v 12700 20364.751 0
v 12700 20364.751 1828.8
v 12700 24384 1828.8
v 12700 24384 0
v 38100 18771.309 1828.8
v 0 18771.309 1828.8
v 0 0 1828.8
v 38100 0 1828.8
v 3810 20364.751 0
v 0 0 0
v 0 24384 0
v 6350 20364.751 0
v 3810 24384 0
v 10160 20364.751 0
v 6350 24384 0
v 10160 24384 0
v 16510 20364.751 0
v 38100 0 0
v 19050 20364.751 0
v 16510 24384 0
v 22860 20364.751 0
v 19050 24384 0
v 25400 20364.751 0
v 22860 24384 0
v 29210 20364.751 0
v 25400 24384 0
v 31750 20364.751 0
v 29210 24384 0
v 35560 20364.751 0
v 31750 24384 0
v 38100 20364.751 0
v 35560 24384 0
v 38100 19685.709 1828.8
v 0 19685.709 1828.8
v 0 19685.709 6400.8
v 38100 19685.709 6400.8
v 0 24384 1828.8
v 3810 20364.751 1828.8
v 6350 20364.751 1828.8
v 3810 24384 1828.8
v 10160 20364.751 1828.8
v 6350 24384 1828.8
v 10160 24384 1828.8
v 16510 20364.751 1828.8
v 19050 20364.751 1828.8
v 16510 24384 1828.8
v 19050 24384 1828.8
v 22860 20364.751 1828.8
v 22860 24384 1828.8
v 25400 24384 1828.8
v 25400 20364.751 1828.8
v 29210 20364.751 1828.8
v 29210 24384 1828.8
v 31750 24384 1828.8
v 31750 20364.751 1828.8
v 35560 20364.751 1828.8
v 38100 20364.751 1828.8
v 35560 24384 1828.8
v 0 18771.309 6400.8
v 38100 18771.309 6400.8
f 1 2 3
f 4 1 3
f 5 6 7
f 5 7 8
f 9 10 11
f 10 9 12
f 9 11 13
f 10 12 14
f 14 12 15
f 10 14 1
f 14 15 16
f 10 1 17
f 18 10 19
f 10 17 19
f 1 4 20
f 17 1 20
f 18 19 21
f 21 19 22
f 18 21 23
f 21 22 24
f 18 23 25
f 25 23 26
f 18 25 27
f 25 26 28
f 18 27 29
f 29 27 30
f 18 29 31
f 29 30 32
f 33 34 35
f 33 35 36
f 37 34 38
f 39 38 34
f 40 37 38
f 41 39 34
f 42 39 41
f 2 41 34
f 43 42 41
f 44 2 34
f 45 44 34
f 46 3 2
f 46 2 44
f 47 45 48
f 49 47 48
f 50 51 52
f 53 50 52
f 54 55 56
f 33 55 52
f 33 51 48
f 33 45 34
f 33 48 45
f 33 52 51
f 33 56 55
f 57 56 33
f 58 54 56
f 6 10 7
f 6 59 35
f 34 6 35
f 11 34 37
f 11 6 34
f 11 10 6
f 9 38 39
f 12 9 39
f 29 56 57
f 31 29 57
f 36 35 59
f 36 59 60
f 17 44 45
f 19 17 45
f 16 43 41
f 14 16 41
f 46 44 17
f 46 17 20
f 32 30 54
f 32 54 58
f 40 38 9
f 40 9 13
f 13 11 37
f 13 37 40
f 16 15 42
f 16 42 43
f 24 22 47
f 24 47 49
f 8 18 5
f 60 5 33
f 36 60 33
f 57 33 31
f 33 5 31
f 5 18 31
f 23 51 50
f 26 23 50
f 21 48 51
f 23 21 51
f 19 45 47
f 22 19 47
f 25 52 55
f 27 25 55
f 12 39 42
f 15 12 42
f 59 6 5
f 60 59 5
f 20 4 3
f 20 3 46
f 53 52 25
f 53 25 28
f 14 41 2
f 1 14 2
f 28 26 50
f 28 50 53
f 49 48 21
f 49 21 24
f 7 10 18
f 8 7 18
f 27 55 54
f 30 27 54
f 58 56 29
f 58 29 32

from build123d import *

# Parameters (mm, degrees)
SKETCH1_W           = 38100
SKETCH1_H           = 24384
BOSS_EXTRUDE1_DEPTH = 1828.8
SKETCH2_W           = 2540
SKETCH2_H           = 4019.249447419
CUT_EXTRUDE2_DEPTH  = 1828.8
SKETCH3_W           = 38100
SKETCH3_H           = 914.4
BOSS_EXTRUDE3_DEPTH = 4572


with BuildPart() as part:
    # Sketch1 → Boss-Extrude1 (new body)
    with BuildSketch(Plane.XY):
        with Locations((19050, 12192)):
            Rectangle(SKETCH1_W, SKETCH1_H)
    extrude(amount=BOSS_EXTRUDE1_DEPTH)

    # Sketch2 → Cut-Extrude2 (cut)
    with BuildSketch(Plane.XY.offset(1828.8)):
        with Locations((5080, 22374.37527629)):
            Rectangle(SKETCH2_W, SKETCH2_H)
        Polygon((11430, 24384), (10160, 24384), (10160, 20364.750552581), (12700, 20364.750552581), (12700, 24384), align=None)
        with Locations((17780, 22374.37527629)):
            Rectangle(SKETCH2_W, SKETCH2_H)
        with Locations((24130, 22374.37527629)):
            Rectangle(SKETCH2_W, SKETCH2_H)
        with Locations((30480, 22374.37527629)):
            Rectangle(SKETCH2_W, SKETCH2_H)
        with Locations((36830, 22374.37527629)):
            Rectangle(SKETCH2_W, SKETCH2_H)
    extrude(amount=-CUT_EXTRUDE2_DEPTH, mode=Mode.SUBTRACT)

    # Sketch3 → Boss-Extrude3 (add)
    with BuildSketch(Plane.XY.offset(1828.8)):
        with Locations((19050, 19228.508963642)):
            Rectangle(SKETCH3_W, SKETCH3_H)
    extrude(amount=BOSS_EXTRUDE3_DEPTH)


solid = part.part
